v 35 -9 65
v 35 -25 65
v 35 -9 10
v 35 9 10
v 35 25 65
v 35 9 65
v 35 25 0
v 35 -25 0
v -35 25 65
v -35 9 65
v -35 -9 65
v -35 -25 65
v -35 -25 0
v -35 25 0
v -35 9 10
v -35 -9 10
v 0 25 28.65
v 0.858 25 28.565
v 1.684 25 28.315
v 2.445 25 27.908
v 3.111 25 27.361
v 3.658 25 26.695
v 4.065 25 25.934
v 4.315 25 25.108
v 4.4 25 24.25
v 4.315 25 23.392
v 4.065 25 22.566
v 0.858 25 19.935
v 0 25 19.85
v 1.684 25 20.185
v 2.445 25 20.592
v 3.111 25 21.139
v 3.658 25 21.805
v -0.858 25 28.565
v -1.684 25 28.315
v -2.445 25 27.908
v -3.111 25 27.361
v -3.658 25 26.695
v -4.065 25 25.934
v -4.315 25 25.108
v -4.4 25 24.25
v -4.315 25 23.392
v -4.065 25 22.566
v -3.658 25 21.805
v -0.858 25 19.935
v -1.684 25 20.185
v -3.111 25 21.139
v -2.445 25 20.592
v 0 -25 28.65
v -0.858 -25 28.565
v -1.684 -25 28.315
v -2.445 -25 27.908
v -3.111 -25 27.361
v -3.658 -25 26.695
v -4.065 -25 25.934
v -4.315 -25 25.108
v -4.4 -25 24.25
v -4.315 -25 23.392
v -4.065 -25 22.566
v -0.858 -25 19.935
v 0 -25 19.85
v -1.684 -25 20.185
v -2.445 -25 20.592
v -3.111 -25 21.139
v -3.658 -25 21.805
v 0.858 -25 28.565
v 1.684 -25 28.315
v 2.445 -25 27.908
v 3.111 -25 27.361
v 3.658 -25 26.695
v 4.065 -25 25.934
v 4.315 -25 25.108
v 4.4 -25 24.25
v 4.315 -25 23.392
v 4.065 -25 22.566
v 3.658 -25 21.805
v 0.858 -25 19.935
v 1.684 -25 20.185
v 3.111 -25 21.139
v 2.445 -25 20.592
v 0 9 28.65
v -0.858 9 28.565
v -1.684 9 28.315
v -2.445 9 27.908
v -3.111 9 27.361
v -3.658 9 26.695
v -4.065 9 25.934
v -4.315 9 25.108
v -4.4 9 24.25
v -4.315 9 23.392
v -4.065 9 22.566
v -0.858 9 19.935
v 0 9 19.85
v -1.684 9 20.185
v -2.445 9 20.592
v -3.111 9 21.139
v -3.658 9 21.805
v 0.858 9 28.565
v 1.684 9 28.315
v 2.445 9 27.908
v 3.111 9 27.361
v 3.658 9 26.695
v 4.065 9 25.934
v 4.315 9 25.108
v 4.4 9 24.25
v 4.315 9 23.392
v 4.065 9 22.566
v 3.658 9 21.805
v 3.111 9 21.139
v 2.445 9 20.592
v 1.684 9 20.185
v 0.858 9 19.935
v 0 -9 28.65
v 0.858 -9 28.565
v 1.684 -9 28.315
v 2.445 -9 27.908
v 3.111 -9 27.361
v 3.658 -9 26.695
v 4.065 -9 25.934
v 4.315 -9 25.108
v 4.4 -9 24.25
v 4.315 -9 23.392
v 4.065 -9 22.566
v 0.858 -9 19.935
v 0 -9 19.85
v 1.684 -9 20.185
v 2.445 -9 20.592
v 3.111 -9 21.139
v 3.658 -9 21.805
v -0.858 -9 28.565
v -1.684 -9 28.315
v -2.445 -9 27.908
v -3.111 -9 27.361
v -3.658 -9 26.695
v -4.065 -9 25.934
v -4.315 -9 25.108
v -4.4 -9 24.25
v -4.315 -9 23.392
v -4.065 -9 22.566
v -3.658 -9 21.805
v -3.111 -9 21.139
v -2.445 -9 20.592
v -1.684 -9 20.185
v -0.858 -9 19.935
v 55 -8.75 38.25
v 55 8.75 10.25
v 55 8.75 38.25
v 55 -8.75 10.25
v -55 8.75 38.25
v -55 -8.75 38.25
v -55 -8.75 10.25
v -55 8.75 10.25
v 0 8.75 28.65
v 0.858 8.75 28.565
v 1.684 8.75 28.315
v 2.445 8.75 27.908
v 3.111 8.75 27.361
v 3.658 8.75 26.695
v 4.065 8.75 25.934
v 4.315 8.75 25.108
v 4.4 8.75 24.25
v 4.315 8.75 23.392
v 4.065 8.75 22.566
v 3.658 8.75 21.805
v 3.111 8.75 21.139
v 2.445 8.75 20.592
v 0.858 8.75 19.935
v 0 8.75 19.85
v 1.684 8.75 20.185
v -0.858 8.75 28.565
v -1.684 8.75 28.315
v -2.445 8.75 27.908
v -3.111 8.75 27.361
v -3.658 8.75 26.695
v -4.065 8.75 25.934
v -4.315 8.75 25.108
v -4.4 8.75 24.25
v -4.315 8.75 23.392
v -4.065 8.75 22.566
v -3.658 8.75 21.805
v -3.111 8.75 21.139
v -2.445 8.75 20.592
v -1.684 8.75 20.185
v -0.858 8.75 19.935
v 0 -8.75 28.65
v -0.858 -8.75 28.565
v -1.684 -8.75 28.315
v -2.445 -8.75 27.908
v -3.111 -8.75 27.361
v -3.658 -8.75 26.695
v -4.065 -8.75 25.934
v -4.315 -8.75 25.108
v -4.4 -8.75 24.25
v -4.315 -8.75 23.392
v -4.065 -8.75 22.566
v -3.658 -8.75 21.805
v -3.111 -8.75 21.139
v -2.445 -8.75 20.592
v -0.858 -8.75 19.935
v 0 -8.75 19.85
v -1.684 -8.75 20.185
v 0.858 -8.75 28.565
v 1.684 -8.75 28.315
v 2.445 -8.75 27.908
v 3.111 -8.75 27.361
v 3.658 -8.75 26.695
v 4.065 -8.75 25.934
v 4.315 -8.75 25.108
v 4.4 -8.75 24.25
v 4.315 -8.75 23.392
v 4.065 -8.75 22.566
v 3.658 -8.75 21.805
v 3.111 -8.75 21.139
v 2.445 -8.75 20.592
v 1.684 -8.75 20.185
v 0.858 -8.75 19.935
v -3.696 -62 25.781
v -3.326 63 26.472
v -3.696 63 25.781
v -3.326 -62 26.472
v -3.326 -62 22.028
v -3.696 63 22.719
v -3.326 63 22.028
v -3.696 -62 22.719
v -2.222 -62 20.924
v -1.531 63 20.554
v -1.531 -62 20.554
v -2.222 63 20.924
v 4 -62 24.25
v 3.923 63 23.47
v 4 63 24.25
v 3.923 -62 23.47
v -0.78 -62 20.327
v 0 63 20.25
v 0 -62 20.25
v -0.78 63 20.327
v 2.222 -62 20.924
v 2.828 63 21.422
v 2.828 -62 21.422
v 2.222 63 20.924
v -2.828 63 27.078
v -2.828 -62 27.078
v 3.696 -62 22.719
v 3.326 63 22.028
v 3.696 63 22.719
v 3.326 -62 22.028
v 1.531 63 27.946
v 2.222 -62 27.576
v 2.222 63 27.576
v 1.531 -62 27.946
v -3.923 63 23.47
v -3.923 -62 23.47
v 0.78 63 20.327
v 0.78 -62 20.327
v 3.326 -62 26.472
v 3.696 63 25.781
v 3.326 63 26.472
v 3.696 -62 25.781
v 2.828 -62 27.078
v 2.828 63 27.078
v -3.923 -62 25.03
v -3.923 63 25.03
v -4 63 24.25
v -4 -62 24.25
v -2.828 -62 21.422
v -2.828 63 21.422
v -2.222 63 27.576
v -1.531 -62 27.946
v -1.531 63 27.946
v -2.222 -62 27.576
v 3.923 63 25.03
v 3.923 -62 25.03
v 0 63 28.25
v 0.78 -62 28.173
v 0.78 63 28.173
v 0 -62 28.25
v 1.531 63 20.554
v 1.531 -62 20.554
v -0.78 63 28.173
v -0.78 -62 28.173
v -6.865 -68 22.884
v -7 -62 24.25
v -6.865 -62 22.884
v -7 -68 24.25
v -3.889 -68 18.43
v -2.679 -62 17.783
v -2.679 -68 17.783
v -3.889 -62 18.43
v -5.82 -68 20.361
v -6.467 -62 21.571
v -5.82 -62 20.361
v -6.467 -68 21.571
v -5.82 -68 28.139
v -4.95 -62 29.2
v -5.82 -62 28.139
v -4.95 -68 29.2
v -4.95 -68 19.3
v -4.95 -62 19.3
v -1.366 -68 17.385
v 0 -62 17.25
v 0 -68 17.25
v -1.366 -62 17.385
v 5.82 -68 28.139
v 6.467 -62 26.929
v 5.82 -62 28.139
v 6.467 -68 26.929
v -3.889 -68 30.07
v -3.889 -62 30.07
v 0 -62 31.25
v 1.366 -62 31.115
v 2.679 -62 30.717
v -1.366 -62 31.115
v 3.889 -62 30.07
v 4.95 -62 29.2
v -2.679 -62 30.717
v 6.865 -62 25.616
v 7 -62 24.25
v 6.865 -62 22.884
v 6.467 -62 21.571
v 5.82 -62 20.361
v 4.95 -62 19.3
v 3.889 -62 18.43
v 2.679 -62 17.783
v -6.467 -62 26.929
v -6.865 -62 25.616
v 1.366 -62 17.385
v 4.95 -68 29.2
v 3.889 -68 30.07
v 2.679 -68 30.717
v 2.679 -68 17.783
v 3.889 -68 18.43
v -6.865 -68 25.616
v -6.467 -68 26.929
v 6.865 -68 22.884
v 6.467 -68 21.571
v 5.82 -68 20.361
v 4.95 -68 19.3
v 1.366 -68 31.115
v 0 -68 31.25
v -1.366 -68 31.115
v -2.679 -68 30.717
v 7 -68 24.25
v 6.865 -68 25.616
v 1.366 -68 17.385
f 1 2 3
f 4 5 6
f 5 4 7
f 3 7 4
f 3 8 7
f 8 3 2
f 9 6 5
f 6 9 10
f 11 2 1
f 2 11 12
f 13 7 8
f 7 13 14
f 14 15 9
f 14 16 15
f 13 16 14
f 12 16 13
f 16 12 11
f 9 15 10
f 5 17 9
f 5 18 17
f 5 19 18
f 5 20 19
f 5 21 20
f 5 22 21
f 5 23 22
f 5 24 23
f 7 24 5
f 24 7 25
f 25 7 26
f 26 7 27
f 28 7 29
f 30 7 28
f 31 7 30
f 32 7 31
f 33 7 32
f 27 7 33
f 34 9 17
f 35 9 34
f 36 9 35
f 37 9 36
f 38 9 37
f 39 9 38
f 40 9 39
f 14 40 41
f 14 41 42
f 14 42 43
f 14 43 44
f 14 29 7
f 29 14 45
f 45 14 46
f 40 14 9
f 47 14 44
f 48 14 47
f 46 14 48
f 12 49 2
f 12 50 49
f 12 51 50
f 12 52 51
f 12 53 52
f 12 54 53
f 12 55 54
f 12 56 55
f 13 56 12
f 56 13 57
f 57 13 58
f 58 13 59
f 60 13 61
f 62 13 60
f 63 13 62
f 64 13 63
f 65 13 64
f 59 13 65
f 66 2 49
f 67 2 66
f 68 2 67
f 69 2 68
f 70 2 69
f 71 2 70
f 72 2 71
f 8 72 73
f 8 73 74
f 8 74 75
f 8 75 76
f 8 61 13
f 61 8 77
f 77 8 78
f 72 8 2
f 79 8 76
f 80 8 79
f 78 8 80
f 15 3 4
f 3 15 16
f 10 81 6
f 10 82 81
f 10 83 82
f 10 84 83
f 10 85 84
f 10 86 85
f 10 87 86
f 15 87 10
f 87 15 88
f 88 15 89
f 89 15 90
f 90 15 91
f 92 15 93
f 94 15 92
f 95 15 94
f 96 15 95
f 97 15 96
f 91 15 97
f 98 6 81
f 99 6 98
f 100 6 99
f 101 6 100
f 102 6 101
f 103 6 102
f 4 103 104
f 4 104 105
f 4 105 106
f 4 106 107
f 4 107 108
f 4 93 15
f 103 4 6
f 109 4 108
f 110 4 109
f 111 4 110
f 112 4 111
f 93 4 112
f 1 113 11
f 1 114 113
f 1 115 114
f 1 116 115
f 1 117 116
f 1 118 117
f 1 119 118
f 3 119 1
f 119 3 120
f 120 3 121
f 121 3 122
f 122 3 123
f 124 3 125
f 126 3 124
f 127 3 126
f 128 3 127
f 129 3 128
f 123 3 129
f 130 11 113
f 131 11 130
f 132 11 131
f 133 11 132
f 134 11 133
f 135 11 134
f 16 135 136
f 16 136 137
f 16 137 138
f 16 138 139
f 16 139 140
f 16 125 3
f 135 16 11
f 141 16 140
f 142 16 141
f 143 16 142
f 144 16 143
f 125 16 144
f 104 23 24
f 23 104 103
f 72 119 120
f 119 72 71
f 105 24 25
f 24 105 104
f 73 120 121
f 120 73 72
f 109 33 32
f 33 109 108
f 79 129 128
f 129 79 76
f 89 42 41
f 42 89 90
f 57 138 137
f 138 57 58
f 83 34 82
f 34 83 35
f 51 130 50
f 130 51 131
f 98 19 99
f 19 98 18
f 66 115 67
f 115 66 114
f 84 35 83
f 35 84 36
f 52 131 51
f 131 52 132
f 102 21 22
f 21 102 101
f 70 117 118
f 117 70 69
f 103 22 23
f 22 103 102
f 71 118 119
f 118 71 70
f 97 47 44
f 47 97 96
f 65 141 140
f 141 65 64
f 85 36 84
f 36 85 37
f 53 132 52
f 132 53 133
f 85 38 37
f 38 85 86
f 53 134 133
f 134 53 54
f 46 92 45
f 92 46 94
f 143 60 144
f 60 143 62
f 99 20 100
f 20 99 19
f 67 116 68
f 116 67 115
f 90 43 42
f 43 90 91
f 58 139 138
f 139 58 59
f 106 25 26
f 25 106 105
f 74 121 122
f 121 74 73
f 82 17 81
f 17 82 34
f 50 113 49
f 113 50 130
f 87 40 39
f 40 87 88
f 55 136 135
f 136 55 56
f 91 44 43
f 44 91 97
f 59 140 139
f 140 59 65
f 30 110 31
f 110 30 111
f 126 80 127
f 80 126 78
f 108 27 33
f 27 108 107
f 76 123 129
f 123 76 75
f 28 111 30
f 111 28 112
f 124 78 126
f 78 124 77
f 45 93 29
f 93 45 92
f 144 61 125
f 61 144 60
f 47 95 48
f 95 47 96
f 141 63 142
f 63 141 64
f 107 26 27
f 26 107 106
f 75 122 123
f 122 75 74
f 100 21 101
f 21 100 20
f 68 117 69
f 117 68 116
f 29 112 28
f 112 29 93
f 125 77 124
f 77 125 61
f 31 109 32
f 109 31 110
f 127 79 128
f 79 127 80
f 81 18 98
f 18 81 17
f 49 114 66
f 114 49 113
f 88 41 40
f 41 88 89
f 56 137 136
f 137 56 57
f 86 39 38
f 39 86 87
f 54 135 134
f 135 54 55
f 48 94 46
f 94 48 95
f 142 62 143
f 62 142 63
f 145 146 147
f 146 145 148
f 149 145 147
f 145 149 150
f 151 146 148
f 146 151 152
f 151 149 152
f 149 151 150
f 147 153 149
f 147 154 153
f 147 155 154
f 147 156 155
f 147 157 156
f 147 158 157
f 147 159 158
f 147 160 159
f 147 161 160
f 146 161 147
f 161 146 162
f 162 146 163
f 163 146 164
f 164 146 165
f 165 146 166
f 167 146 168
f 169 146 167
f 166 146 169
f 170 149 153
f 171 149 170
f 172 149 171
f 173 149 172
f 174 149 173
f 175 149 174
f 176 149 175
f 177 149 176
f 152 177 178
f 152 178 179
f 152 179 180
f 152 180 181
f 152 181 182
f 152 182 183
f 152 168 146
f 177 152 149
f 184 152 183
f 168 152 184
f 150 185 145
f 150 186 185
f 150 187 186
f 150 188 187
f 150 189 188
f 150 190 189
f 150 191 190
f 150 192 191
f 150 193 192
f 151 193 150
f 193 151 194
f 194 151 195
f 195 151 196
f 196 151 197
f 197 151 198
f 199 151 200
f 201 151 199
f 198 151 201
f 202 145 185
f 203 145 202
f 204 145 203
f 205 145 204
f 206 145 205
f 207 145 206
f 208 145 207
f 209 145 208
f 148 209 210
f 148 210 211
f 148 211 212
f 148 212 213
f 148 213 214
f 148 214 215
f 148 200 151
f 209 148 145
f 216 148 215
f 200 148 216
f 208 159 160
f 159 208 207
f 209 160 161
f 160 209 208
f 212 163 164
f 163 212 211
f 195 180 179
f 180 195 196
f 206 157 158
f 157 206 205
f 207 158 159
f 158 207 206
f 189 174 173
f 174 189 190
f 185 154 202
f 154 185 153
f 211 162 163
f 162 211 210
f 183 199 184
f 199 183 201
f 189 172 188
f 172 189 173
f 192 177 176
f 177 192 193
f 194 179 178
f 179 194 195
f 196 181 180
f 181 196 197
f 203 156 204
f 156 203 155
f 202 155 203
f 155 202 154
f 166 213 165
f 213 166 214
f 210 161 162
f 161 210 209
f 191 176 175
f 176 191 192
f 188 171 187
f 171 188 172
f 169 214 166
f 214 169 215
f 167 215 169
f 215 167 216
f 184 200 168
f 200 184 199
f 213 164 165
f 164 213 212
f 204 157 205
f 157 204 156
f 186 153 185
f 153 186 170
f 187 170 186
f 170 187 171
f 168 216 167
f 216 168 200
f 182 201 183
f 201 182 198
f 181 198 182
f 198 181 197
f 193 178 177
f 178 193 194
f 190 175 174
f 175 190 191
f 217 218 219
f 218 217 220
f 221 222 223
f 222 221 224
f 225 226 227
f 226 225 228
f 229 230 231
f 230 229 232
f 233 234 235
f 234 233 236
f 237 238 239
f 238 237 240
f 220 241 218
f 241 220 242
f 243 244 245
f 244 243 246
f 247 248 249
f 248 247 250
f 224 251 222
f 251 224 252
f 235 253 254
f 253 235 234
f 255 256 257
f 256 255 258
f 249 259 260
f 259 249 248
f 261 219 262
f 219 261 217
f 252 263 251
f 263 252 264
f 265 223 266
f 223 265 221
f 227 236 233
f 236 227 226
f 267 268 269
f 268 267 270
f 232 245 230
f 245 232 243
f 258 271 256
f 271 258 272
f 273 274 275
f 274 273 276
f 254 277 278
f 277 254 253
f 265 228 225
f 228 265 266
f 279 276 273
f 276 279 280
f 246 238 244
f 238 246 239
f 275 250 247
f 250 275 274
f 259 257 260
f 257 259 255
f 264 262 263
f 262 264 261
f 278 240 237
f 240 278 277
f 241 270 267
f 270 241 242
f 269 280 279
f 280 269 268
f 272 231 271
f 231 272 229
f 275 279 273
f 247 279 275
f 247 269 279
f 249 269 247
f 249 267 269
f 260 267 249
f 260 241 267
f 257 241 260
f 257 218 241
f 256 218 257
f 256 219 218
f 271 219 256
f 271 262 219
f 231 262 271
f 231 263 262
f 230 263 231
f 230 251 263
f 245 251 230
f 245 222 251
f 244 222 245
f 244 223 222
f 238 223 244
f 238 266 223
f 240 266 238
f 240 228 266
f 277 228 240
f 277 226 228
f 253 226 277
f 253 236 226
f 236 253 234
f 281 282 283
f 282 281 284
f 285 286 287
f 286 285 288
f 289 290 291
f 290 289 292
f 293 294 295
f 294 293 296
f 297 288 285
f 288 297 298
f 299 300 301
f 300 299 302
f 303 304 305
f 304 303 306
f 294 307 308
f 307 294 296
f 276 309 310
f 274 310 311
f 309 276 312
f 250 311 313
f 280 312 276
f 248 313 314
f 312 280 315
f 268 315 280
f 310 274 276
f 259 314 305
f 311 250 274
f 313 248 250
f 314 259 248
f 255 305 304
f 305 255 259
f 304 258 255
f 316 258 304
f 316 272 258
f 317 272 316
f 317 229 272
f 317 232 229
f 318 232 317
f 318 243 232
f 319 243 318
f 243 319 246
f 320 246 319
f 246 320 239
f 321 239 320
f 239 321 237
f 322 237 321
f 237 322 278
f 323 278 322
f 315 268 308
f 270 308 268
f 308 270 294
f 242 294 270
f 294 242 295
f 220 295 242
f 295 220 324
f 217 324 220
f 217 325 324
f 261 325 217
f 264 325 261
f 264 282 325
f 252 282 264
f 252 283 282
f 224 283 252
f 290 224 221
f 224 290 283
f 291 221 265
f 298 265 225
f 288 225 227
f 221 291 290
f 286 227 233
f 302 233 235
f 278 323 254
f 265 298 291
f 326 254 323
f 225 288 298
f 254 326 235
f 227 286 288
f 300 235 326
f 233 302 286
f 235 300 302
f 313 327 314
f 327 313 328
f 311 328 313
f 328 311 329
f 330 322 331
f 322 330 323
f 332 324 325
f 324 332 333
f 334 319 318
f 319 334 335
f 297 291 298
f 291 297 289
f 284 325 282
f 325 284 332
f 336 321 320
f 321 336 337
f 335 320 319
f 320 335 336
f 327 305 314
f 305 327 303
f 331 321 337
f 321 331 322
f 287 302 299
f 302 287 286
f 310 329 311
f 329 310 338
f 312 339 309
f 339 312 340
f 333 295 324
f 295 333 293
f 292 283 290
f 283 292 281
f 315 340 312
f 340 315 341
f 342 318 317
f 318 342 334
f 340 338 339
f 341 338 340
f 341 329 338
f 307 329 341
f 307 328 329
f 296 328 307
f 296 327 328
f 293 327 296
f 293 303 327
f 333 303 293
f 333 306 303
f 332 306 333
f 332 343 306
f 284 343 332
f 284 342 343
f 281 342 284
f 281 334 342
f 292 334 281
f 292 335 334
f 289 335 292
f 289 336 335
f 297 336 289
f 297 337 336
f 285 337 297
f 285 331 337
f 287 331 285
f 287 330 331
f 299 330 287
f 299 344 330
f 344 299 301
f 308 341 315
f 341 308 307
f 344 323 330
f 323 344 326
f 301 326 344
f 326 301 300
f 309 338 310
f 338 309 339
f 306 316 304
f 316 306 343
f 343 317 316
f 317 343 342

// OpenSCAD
$fn = 32;

// ------------------------------------------------------------------------
// Clevis joint: 70 mm clevis, pin d8
// Every part is its own module, assembly() places them once.
// ------------------------------------------------------------------------

// --- part 1 ---
module clevis() {
  difference() {
    translate([-35, -25, 0]) cube([70, 50, 65]);
    translate([-36, -9, 10]) cube([72, 18, 56]);
    translate([0, 0, 24.25]) rotate([90, 0, 0]) cylinder(h = 52, d = 8.8, center = true);
  }
}

// --- part 2 ---
module eye() {
  difference() {
    translate([-55, -8.75, 0]) cube([110, 17.5, 28]);
    translate([0, 0, 14]) rotate([90, 0, 0]) cylinder(h = 19.5, d = 8.8, center = true);
  }
}

// --- part 3 ---
module pin() {
  rotate([0, 90, 0]) cylinder(h = 126, d = 8, center = true);
  translate([-68, 0, 0]) rotate([0, 90, 0]) cylinder(h = 6, d = 14);
}

// --- assembly ---
module assembly() {
  translate([0, 0, 0]) rotate([0, 0, 0]) clevis();
  translate([0, 0, 10.25]) rotate([0, 0, 0]) eye();
  translate([0, 0, 24.25]) rotate([0, 0, 90]) pin();
}

assembly();
